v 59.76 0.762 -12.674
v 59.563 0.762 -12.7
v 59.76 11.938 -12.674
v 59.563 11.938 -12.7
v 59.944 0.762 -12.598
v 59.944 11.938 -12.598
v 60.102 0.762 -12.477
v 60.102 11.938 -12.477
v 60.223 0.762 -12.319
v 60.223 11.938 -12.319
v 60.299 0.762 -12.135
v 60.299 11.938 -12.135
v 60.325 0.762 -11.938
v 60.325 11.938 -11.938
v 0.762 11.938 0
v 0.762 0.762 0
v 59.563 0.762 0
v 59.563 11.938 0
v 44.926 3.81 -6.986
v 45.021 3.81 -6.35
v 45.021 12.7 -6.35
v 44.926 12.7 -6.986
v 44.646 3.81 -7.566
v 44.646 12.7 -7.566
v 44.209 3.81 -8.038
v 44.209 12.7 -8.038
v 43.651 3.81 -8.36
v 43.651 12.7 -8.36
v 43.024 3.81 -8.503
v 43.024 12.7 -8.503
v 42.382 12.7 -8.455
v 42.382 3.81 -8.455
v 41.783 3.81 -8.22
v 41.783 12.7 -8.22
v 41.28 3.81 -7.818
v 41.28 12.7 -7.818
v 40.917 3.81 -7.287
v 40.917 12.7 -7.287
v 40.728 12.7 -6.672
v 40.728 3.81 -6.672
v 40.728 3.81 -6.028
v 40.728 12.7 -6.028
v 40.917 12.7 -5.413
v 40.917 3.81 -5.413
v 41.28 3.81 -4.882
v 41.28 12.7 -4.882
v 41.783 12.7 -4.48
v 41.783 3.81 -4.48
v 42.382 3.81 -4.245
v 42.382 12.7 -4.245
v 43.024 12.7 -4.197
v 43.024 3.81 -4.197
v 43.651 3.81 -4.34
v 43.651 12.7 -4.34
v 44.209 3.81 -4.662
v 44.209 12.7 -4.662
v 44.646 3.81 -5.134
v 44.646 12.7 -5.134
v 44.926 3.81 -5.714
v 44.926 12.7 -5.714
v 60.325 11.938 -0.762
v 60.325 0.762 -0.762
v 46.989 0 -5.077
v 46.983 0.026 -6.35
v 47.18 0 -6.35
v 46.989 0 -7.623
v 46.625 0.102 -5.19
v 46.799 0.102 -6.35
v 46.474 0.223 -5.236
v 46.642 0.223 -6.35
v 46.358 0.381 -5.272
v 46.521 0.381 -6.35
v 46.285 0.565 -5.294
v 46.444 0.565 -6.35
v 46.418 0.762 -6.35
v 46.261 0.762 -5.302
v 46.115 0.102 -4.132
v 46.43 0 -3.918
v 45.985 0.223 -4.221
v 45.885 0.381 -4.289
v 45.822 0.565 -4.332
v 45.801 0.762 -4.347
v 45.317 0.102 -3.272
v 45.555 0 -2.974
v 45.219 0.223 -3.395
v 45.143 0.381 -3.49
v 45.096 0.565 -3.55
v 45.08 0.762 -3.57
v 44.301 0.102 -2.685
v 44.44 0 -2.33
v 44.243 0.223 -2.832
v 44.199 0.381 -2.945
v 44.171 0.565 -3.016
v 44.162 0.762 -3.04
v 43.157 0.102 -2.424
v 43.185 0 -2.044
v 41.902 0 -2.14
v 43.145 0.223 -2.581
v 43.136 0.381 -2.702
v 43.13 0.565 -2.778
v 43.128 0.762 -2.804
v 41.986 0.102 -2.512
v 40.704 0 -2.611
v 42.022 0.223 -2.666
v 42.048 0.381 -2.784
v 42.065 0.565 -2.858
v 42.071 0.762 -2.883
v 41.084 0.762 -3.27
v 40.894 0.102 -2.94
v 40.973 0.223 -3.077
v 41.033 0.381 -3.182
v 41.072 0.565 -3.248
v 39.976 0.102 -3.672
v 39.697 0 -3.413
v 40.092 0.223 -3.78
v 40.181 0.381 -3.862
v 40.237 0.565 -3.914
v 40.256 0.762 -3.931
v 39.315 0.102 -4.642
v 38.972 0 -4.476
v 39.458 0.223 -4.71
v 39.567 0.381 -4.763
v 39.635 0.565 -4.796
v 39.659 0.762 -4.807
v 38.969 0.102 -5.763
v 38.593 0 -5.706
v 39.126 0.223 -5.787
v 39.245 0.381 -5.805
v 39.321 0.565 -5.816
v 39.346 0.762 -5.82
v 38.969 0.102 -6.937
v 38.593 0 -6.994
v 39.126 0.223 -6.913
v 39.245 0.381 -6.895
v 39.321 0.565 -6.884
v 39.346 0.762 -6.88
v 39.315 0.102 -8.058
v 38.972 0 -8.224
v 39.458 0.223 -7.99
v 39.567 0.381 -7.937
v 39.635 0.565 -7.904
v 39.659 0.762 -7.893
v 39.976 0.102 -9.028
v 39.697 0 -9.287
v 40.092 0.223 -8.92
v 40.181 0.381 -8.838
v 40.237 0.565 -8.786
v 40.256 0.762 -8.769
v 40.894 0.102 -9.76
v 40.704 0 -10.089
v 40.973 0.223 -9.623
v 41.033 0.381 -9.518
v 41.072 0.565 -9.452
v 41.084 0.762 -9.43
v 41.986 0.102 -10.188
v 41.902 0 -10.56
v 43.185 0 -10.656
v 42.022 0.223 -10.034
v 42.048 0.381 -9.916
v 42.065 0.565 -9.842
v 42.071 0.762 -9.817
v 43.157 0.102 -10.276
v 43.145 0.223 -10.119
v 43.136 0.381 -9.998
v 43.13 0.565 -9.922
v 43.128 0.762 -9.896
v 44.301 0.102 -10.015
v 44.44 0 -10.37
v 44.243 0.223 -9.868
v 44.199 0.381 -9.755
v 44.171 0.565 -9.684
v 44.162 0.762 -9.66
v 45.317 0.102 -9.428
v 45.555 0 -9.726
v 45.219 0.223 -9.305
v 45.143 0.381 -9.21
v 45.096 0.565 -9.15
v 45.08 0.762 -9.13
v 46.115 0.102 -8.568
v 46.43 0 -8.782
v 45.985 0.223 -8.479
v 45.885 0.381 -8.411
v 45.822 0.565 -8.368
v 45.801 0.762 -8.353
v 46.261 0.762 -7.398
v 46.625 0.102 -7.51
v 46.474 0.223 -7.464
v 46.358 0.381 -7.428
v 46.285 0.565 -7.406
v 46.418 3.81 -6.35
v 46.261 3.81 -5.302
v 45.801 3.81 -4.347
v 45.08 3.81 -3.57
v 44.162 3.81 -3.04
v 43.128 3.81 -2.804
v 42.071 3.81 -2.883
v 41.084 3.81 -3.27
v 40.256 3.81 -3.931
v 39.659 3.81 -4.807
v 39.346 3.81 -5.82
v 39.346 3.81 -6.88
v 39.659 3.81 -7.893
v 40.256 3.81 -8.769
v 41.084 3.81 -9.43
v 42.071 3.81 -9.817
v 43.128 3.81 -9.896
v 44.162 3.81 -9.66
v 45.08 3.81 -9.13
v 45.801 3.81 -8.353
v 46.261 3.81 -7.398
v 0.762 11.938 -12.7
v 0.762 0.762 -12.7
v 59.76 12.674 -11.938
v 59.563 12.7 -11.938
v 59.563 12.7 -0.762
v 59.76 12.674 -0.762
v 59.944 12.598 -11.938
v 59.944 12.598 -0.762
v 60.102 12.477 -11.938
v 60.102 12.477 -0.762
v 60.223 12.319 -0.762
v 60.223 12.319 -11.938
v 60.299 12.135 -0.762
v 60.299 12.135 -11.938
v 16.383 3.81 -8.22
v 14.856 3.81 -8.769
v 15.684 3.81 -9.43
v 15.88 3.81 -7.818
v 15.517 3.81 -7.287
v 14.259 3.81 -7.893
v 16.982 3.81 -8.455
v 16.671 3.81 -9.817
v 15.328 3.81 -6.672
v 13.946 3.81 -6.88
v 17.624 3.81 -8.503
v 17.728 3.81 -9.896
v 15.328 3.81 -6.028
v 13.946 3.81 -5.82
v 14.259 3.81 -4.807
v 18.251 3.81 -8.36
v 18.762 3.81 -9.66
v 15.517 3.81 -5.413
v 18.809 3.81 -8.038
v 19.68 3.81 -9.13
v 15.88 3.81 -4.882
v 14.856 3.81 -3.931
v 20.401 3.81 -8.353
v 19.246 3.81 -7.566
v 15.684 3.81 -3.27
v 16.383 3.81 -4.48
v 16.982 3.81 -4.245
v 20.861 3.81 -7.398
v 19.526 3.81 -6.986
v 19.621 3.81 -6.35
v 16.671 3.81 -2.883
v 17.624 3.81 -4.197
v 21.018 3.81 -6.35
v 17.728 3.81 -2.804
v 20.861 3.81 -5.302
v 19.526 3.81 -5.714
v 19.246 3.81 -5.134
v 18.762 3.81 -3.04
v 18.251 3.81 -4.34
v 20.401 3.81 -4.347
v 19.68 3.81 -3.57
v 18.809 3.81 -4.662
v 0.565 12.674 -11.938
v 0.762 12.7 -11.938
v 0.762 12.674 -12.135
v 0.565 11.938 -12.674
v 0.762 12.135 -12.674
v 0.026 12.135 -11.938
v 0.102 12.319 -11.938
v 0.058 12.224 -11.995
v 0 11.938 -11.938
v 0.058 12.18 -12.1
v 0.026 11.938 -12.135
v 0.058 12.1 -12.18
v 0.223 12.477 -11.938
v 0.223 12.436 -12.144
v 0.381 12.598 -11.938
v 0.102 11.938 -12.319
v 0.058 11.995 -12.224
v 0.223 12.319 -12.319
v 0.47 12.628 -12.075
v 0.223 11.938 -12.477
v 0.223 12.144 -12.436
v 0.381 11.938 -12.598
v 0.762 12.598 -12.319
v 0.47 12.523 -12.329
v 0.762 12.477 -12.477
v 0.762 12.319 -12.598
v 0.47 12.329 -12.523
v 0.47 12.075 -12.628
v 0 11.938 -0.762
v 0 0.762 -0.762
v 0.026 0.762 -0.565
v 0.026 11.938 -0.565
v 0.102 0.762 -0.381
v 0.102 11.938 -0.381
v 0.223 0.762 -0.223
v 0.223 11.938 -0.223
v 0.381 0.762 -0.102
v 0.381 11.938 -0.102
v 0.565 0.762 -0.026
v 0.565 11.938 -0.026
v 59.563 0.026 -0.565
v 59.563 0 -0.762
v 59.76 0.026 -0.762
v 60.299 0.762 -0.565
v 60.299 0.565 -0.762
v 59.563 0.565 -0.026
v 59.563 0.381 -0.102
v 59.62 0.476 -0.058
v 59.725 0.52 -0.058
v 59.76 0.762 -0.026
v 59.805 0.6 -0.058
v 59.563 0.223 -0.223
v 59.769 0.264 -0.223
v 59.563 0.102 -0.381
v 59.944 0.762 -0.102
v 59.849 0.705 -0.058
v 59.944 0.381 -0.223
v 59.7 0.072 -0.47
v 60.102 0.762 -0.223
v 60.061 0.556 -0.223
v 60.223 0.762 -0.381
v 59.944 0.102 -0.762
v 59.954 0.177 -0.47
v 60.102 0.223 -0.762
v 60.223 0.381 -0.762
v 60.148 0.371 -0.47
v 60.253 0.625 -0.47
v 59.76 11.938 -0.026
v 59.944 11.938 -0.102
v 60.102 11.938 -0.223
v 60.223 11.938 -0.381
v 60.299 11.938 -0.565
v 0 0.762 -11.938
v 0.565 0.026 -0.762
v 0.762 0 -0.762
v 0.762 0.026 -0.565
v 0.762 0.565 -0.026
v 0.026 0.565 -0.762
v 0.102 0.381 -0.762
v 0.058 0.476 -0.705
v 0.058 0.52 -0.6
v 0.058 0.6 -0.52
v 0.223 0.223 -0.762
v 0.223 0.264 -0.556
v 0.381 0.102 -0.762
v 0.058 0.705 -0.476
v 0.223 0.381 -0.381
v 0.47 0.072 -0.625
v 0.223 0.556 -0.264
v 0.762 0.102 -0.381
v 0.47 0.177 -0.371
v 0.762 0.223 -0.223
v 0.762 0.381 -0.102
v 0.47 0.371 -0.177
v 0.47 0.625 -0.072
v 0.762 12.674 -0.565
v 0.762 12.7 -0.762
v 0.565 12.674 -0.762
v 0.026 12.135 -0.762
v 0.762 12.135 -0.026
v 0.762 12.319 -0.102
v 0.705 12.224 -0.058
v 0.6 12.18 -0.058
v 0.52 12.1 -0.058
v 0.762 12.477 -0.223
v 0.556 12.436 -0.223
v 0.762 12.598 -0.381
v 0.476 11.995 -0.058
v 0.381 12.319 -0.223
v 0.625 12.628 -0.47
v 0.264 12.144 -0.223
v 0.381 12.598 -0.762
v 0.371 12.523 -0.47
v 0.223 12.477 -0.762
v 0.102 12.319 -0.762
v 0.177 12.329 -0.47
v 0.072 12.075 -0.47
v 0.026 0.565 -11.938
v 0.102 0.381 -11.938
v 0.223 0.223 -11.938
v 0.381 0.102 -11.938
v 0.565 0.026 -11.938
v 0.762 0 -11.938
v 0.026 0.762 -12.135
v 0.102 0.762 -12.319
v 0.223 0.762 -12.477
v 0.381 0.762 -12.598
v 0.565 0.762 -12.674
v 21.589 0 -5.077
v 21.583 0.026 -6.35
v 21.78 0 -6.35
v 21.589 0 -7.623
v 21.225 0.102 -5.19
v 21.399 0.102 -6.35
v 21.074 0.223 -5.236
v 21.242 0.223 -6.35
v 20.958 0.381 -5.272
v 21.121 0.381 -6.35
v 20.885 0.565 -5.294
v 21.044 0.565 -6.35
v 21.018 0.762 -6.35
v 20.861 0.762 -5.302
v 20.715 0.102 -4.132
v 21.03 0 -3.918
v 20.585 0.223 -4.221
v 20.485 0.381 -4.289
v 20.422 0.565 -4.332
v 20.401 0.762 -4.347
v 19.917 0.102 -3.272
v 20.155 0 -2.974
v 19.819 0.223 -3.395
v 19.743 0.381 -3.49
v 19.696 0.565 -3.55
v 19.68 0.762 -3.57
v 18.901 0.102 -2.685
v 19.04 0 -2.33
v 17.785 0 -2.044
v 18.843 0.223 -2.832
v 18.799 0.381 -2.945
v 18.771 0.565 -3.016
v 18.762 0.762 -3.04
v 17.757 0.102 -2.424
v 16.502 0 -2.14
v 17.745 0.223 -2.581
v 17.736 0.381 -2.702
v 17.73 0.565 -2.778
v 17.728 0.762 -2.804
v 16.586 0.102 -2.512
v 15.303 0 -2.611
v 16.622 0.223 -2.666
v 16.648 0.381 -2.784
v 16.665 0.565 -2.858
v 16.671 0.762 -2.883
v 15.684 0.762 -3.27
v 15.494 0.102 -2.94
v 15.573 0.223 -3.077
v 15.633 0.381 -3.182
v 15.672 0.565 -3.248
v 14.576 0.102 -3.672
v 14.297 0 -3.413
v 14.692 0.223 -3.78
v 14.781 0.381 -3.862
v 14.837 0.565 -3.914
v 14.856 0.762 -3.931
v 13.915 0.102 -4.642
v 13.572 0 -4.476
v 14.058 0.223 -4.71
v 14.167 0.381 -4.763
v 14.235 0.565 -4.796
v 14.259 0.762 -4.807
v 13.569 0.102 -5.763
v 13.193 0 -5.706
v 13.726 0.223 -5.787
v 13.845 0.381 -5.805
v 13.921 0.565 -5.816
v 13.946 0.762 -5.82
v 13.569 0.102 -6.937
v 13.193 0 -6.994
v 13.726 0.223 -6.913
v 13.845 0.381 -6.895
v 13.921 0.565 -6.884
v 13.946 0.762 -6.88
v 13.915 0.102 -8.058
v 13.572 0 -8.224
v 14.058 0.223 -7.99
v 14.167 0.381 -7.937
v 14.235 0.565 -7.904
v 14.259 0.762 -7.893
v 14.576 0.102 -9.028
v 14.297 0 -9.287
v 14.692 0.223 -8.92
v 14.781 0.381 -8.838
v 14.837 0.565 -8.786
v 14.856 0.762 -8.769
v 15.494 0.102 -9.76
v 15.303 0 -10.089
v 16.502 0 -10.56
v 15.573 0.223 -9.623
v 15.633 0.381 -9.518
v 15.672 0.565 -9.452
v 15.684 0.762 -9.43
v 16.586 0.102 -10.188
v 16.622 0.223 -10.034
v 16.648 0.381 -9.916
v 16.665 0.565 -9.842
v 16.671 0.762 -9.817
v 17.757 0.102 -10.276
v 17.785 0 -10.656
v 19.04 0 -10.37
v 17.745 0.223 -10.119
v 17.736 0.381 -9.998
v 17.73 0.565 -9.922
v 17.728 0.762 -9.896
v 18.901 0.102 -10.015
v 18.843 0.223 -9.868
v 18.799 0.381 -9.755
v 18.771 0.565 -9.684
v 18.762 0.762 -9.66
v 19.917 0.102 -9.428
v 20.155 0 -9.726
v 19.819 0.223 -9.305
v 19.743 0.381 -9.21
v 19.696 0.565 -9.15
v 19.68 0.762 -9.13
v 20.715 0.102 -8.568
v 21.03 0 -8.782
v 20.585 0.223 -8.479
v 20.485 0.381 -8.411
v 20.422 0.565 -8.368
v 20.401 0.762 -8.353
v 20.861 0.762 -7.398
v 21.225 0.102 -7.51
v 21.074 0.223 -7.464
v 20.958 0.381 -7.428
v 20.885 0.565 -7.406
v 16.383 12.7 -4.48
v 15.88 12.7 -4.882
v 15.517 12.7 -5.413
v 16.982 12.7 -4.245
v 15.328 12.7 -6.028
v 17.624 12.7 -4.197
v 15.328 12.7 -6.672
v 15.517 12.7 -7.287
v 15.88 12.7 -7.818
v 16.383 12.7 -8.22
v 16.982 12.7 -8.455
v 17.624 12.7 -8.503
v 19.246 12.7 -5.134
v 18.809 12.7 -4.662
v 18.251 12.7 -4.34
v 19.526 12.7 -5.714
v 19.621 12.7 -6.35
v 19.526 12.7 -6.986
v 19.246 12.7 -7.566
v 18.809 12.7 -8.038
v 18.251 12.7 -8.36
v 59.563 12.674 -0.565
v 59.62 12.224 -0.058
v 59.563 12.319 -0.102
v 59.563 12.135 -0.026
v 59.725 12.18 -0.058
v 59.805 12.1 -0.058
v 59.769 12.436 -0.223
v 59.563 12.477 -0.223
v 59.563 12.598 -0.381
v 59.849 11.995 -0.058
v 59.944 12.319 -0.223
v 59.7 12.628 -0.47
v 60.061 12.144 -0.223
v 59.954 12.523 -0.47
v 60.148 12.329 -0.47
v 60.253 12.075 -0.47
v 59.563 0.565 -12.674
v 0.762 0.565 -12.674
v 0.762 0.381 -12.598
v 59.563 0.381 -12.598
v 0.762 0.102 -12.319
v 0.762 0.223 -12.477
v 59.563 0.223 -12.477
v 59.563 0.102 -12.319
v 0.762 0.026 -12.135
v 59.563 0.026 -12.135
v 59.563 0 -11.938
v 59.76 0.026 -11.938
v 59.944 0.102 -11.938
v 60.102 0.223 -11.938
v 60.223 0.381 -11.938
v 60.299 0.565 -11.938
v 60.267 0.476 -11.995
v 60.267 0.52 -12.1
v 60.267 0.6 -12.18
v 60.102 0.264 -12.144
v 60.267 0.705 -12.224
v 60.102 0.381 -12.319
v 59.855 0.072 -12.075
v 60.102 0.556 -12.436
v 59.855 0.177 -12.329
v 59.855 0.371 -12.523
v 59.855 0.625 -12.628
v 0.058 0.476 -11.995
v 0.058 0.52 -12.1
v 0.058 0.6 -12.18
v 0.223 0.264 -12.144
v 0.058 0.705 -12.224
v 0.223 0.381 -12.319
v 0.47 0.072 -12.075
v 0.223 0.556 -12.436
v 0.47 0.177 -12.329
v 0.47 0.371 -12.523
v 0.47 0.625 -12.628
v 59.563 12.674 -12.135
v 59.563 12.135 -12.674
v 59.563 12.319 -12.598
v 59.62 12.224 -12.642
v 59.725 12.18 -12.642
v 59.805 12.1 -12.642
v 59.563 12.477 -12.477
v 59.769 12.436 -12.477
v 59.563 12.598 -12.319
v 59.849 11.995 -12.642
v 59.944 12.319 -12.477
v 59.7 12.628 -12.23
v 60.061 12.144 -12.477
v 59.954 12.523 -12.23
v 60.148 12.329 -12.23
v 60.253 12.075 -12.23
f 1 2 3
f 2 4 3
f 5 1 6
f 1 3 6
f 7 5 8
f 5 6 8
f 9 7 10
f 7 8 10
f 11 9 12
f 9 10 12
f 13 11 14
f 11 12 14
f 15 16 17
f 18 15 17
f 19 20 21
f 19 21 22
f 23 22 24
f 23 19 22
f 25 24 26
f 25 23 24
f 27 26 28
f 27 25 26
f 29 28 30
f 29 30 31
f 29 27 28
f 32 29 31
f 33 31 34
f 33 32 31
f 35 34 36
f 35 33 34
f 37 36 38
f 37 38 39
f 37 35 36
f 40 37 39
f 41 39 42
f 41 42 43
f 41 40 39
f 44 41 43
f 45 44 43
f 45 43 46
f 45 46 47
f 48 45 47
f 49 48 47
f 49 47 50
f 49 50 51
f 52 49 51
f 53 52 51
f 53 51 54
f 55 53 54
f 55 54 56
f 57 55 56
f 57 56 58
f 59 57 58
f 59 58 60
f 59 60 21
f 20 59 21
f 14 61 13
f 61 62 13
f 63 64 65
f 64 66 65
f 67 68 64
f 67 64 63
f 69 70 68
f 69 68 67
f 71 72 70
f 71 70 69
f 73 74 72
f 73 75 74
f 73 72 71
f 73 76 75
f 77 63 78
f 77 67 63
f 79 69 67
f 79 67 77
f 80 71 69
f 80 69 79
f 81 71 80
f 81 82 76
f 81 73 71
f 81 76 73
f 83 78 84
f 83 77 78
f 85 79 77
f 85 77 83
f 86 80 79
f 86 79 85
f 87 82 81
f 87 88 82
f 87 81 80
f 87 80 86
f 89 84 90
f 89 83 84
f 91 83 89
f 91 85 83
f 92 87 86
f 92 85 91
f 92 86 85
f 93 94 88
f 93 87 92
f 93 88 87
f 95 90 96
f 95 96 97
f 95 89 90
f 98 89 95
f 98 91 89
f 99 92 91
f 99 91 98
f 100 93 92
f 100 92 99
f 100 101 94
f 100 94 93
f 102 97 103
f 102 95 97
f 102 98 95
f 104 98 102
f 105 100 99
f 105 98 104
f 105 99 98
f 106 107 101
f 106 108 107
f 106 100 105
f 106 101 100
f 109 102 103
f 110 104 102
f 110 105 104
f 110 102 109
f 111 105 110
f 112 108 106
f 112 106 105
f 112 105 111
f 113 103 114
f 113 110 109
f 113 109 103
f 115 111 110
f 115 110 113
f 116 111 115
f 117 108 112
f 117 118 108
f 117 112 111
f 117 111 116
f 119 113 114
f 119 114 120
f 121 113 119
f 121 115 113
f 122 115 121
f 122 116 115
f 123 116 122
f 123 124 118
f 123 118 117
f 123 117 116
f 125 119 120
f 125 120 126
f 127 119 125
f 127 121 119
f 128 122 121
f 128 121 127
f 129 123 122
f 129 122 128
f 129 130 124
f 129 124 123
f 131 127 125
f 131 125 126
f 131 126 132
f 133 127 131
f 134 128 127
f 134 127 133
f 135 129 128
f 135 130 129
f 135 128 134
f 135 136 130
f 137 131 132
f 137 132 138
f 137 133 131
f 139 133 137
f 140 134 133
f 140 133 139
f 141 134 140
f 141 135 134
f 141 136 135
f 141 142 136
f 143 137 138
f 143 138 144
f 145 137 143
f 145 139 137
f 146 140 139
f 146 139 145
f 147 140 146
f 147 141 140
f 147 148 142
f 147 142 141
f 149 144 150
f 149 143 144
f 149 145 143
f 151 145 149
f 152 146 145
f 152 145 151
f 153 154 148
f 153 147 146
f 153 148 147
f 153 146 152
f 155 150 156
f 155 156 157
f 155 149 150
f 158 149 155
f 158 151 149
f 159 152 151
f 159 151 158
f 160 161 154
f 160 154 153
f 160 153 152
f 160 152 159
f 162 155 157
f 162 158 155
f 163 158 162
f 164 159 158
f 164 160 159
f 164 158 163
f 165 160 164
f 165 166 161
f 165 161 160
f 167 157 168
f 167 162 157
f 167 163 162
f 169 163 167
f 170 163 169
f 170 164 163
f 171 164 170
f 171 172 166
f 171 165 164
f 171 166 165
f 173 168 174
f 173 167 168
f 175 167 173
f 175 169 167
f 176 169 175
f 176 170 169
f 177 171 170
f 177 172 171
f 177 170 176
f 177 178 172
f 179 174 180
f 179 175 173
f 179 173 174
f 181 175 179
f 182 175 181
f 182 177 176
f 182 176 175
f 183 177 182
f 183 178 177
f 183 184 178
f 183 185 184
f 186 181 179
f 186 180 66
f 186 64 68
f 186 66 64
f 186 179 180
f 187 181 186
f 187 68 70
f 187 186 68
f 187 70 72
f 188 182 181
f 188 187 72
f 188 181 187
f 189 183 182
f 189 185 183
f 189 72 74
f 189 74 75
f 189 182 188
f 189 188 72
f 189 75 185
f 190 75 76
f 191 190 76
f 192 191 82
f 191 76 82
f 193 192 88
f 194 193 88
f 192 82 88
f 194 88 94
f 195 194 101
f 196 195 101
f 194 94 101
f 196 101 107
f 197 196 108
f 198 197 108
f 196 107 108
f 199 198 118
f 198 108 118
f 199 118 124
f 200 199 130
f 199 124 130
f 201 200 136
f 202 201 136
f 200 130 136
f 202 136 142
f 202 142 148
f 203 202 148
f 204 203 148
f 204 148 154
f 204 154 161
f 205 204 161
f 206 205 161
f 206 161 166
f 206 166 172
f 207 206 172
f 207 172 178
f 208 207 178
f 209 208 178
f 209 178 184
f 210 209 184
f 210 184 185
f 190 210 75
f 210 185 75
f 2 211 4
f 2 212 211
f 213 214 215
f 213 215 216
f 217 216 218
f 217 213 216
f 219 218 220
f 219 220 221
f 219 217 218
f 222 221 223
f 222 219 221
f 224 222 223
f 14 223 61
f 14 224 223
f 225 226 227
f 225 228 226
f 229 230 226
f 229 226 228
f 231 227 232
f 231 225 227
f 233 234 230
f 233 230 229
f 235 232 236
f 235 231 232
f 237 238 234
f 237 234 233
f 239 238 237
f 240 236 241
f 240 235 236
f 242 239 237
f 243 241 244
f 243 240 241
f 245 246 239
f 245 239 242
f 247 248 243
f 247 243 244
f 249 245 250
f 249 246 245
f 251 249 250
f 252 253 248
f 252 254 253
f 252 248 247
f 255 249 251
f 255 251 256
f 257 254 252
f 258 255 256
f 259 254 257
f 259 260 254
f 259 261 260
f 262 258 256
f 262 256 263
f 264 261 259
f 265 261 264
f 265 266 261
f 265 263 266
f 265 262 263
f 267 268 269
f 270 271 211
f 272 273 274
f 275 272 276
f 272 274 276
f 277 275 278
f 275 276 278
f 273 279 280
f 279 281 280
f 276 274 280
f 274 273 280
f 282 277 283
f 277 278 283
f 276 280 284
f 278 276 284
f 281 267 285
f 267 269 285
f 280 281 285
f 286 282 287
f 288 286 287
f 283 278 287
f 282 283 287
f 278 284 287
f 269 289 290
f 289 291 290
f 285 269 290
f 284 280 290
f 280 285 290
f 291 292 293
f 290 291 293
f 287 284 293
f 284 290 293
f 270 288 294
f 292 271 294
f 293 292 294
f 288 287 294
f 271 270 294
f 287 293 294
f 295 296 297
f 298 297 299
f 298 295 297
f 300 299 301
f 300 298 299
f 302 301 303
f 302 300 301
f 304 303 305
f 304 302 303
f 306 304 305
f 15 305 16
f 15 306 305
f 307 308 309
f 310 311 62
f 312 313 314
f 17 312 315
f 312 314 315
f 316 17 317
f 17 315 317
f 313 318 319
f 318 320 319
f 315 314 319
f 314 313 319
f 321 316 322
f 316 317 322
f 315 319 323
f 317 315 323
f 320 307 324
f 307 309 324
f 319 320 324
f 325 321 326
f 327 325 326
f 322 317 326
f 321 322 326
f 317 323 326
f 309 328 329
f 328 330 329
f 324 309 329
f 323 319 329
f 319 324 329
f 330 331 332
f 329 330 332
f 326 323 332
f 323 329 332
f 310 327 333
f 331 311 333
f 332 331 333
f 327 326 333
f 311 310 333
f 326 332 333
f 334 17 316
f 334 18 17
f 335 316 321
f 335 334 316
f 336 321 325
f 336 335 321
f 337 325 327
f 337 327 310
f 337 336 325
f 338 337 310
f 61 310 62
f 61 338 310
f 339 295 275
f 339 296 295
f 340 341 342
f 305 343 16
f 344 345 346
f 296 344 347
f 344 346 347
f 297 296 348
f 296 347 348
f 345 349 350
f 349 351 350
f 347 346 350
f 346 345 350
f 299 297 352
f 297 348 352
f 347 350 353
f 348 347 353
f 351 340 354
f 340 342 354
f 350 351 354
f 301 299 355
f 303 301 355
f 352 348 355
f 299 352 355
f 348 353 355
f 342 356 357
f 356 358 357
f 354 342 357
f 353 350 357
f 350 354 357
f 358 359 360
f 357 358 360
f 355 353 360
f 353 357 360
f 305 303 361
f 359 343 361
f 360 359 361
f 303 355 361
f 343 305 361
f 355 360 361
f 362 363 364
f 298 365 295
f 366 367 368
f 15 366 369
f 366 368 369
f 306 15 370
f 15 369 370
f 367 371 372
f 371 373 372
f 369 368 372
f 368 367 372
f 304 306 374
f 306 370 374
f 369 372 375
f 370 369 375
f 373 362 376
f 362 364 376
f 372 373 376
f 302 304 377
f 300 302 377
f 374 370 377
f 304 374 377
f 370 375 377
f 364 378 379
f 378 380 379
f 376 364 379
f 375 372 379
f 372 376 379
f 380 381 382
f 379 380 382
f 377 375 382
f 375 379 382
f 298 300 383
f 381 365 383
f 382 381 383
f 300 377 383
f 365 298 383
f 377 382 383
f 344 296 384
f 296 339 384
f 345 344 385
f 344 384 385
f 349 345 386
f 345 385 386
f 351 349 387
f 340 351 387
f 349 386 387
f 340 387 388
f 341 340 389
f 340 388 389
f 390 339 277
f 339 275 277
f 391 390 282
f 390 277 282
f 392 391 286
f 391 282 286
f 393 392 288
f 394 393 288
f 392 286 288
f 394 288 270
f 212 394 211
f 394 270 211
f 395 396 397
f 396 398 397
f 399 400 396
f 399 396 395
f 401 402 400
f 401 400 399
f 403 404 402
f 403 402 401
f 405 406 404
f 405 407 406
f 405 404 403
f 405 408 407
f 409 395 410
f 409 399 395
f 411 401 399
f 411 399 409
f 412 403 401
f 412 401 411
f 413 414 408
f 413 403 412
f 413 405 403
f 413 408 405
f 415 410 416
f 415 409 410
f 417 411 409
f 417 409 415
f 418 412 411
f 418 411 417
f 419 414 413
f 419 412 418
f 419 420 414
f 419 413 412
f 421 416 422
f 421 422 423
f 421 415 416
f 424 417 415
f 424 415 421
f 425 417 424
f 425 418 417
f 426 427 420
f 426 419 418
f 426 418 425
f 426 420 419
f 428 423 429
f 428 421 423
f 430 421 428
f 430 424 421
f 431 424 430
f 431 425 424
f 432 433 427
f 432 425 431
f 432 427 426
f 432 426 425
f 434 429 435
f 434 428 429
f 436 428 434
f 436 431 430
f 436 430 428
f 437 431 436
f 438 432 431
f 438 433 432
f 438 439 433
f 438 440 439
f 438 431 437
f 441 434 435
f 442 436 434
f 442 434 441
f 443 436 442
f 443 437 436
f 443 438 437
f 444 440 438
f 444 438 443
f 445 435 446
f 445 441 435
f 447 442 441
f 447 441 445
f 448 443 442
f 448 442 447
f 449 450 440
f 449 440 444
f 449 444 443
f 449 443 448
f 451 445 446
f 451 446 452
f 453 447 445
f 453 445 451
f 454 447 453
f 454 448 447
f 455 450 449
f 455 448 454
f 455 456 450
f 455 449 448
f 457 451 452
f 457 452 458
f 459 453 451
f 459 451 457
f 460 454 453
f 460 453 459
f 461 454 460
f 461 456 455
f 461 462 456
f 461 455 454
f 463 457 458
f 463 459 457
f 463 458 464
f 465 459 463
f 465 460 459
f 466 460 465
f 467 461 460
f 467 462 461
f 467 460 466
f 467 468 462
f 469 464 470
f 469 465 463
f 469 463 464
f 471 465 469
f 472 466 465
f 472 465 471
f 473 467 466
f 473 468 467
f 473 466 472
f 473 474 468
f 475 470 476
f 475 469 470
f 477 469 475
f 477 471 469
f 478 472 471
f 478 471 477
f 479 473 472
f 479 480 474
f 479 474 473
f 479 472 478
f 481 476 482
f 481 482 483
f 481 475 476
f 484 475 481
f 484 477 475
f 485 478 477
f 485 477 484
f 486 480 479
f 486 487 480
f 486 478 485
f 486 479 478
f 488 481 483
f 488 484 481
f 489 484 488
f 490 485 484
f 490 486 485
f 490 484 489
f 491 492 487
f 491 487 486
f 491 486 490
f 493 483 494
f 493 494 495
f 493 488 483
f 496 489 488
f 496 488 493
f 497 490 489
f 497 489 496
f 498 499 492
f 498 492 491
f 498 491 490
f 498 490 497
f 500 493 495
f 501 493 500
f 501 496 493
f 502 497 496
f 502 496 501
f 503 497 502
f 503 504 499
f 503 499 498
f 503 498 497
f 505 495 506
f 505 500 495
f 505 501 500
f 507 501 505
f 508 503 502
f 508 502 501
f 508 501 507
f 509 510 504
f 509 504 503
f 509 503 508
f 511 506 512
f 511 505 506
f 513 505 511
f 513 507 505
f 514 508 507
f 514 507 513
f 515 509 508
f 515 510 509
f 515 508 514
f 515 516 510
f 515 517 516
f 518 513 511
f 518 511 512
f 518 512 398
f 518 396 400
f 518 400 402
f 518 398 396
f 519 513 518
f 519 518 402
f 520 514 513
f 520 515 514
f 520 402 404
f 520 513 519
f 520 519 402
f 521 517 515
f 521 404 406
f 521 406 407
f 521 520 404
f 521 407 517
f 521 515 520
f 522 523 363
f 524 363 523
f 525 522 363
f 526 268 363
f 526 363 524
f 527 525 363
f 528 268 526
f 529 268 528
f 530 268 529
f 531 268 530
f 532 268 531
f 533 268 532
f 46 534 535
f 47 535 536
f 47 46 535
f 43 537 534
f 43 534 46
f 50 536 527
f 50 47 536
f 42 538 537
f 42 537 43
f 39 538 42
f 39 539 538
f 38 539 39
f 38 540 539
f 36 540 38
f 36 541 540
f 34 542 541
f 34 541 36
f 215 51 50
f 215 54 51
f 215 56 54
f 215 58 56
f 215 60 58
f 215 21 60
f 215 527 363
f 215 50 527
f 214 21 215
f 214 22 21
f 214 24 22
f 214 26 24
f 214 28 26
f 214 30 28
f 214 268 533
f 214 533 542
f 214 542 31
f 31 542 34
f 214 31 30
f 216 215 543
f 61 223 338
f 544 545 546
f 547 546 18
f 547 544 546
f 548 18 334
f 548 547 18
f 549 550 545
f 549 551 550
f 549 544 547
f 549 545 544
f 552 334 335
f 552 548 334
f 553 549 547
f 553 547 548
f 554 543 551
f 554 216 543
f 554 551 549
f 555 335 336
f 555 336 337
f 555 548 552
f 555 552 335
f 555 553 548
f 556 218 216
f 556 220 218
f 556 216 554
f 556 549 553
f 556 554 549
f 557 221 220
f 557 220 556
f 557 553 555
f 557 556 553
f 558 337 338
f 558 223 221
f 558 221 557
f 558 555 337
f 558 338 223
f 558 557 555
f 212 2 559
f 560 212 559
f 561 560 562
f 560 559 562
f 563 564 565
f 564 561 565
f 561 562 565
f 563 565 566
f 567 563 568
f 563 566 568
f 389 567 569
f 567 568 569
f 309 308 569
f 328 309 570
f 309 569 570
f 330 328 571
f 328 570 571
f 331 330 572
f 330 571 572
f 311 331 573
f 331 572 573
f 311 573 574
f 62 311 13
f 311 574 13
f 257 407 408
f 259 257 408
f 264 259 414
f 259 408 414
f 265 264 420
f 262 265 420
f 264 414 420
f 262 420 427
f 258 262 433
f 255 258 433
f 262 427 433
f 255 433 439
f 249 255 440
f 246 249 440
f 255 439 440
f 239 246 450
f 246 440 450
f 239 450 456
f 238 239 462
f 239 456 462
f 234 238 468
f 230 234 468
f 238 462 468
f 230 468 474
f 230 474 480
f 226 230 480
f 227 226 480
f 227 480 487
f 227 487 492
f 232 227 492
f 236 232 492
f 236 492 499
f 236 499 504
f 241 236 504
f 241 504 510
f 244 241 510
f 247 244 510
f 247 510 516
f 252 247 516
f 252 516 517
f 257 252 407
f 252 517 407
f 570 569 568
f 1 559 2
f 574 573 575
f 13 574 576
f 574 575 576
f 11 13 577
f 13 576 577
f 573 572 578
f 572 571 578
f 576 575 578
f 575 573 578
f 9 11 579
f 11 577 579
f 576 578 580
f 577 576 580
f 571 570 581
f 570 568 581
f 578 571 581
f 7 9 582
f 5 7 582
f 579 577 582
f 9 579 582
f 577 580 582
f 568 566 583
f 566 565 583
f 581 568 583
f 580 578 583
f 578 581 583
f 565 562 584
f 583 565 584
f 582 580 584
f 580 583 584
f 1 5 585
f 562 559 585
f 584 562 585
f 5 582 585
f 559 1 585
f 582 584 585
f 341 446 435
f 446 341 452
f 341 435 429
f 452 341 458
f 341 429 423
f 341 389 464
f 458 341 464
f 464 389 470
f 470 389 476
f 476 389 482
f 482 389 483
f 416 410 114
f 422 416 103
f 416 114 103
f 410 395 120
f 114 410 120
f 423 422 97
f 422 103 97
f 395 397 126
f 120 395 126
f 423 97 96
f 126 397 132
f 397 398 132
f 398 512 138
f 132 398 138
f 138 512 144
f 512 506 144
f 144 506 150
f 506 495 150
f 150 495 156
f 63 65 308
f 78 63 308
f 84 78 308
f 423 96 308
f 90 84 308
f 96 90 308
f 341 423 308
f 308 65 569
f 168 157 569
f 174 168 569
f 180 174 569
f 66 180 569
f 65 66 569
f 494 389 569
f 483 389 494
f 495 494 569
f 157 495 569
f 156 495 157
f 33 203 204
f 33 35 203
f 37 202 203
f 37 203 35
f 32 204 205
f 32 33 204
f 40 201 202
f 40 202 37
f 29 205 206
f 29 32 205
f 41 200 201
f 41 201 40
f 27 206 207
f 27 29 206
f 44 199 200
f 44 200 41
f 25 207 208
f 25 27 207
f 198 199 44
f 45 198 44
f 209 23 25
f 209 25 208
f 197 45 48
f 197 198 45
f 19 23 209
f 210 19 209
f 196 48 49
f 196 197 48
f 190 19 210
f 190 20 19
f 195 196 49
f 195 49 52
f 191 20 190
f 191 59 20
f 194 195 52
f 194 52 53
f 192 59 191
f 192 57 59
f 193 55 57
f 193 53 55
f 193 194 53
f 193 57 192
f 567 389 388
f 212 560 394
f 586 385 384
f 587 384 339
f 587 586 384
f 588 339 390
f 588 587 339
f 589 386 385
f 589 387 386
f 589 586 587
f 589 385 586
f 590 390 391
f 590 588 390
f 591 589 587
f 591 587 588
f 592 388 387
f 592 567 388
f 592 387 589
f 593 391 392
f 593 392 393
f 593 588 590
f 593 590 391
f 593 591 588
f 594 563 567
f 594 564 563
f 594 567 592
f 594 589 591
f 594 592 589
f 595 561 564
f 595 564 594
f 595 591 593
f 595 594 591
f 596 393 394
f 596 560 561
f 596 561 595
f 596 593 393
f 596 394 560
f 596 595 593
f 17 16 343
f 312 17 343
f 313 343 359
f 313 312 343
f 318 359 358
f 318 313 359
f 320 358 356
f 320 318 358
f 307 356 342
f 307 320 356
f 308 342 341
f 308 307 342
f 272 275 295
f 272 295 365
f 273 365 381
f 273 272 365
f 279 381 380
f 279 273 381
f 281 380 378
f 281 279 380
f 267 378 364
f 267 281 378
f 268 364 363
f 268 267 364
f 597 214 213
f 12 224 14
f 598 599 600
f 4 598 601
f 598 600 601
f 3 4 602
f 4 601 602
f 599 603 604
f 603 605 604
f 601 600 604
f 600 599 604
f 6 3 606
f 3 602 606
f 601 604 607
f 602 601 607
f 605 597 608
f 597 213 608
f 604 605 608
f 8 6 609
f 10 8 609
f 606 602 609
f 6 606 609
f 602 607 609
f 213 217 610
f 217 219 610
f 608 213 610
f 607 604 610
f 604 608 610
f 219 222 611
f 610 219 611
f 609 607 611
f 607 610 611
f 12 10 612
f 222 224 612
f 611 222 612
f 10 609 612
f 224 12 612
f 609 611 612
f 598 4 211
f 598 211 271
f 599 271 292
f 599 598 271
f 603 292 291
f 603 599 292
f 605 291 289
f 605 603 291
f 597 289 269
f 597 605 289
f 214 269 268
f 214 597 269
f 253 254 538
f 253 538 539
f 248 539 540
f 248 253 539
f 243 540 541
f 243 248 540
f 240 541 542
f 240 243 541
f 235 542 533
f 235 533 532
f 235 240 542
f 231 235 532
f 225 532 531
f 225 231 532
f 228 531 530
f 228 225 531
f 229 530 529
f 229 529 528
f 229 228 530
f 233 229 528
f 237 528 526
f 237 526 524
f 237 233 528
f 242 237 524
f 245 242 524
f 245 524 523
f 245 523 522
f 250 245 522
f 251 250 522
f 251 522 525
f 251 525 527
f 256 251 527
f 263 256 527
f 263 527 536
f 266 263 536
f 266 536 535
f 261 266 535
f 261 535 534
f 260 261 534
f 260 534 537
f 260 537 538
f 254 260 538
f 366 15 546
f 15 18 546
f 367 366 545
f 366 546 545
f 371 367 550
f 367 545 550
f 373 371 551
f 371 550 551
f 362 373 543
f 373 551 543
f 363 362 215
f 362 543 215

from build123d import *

# Parameters (mm, degrees)
SKETCH1_W           = 60.325
SKETCH1_H           = 12.7
SKETCH1_R           = 2.159
BOSS_EXTRUDE1_DEPTH = 12.7
SKETCH5_R           = 3.556
CUT_EXTRUDE1_DEPTH  = 3.81
FILLET1_R           = 0.762


with BuildPart() as part:
    # Sketch1 → Boss-Extrude1 (new body)
    with BuildSketch(Plane(origin=(0, 0, 0), x_dir=(1, 0, 0), z_dir=(0, 1, 0))):
        with Locations((30.1625, 6.35)):
            Rectangle(SKETCH1_W, SKETCH1_H)
        with Locations((17.4625, 6.35)):
            Circle(SKETCH1_R, mode=Mode.SUBTRACT)
        with Locations((42.8625, 6.35)):
            Circle(SKETCH1_R, mode=Mode.SUBTRACT)
    extrude(amount=BOSS_EXTRUDE1_DEPTH)

    # Sketch5 → Cut-Extrude1 (cut)
    with BuildSketch(Plane.XZ):
        with Locations((42.8625, -6.35)):
            Circle(SKETCH5_R)
        with Locations((17.4625, -6.35)):
            Circle(SKETCH5_R)
    extrude(amount=-CUT_EXTRUDE1_DEPTH, mode=Mode.SUBTRACT)

    # Fillet1
    fillet1_edges = [part.edges().sort_by_distance(p)[0] for p in [
        (60.325, 12.7, -6.35),
        (30.1625, 12.7, -12.7),
        (39.3065, 0, -6.35),
        (13.9065, 0, -6.35),
        (0, 12.7, -6.35),
        (30.1625, 0, -12.7),
        (60.325, 0, -6.35),
        (30.1625, 0, 0),
        (0, 0, -6.35),
        (30.1625, 12.7, 0),
        (0, 6.35, -12.7),
        (60.325, 6.35, -12.7),
        (60.325, 6.35, 0),
        (0, 6.35, 0),
    ]]
    fillet(fillet1_edges, radius=FILLET1_R)


solid = part.part
